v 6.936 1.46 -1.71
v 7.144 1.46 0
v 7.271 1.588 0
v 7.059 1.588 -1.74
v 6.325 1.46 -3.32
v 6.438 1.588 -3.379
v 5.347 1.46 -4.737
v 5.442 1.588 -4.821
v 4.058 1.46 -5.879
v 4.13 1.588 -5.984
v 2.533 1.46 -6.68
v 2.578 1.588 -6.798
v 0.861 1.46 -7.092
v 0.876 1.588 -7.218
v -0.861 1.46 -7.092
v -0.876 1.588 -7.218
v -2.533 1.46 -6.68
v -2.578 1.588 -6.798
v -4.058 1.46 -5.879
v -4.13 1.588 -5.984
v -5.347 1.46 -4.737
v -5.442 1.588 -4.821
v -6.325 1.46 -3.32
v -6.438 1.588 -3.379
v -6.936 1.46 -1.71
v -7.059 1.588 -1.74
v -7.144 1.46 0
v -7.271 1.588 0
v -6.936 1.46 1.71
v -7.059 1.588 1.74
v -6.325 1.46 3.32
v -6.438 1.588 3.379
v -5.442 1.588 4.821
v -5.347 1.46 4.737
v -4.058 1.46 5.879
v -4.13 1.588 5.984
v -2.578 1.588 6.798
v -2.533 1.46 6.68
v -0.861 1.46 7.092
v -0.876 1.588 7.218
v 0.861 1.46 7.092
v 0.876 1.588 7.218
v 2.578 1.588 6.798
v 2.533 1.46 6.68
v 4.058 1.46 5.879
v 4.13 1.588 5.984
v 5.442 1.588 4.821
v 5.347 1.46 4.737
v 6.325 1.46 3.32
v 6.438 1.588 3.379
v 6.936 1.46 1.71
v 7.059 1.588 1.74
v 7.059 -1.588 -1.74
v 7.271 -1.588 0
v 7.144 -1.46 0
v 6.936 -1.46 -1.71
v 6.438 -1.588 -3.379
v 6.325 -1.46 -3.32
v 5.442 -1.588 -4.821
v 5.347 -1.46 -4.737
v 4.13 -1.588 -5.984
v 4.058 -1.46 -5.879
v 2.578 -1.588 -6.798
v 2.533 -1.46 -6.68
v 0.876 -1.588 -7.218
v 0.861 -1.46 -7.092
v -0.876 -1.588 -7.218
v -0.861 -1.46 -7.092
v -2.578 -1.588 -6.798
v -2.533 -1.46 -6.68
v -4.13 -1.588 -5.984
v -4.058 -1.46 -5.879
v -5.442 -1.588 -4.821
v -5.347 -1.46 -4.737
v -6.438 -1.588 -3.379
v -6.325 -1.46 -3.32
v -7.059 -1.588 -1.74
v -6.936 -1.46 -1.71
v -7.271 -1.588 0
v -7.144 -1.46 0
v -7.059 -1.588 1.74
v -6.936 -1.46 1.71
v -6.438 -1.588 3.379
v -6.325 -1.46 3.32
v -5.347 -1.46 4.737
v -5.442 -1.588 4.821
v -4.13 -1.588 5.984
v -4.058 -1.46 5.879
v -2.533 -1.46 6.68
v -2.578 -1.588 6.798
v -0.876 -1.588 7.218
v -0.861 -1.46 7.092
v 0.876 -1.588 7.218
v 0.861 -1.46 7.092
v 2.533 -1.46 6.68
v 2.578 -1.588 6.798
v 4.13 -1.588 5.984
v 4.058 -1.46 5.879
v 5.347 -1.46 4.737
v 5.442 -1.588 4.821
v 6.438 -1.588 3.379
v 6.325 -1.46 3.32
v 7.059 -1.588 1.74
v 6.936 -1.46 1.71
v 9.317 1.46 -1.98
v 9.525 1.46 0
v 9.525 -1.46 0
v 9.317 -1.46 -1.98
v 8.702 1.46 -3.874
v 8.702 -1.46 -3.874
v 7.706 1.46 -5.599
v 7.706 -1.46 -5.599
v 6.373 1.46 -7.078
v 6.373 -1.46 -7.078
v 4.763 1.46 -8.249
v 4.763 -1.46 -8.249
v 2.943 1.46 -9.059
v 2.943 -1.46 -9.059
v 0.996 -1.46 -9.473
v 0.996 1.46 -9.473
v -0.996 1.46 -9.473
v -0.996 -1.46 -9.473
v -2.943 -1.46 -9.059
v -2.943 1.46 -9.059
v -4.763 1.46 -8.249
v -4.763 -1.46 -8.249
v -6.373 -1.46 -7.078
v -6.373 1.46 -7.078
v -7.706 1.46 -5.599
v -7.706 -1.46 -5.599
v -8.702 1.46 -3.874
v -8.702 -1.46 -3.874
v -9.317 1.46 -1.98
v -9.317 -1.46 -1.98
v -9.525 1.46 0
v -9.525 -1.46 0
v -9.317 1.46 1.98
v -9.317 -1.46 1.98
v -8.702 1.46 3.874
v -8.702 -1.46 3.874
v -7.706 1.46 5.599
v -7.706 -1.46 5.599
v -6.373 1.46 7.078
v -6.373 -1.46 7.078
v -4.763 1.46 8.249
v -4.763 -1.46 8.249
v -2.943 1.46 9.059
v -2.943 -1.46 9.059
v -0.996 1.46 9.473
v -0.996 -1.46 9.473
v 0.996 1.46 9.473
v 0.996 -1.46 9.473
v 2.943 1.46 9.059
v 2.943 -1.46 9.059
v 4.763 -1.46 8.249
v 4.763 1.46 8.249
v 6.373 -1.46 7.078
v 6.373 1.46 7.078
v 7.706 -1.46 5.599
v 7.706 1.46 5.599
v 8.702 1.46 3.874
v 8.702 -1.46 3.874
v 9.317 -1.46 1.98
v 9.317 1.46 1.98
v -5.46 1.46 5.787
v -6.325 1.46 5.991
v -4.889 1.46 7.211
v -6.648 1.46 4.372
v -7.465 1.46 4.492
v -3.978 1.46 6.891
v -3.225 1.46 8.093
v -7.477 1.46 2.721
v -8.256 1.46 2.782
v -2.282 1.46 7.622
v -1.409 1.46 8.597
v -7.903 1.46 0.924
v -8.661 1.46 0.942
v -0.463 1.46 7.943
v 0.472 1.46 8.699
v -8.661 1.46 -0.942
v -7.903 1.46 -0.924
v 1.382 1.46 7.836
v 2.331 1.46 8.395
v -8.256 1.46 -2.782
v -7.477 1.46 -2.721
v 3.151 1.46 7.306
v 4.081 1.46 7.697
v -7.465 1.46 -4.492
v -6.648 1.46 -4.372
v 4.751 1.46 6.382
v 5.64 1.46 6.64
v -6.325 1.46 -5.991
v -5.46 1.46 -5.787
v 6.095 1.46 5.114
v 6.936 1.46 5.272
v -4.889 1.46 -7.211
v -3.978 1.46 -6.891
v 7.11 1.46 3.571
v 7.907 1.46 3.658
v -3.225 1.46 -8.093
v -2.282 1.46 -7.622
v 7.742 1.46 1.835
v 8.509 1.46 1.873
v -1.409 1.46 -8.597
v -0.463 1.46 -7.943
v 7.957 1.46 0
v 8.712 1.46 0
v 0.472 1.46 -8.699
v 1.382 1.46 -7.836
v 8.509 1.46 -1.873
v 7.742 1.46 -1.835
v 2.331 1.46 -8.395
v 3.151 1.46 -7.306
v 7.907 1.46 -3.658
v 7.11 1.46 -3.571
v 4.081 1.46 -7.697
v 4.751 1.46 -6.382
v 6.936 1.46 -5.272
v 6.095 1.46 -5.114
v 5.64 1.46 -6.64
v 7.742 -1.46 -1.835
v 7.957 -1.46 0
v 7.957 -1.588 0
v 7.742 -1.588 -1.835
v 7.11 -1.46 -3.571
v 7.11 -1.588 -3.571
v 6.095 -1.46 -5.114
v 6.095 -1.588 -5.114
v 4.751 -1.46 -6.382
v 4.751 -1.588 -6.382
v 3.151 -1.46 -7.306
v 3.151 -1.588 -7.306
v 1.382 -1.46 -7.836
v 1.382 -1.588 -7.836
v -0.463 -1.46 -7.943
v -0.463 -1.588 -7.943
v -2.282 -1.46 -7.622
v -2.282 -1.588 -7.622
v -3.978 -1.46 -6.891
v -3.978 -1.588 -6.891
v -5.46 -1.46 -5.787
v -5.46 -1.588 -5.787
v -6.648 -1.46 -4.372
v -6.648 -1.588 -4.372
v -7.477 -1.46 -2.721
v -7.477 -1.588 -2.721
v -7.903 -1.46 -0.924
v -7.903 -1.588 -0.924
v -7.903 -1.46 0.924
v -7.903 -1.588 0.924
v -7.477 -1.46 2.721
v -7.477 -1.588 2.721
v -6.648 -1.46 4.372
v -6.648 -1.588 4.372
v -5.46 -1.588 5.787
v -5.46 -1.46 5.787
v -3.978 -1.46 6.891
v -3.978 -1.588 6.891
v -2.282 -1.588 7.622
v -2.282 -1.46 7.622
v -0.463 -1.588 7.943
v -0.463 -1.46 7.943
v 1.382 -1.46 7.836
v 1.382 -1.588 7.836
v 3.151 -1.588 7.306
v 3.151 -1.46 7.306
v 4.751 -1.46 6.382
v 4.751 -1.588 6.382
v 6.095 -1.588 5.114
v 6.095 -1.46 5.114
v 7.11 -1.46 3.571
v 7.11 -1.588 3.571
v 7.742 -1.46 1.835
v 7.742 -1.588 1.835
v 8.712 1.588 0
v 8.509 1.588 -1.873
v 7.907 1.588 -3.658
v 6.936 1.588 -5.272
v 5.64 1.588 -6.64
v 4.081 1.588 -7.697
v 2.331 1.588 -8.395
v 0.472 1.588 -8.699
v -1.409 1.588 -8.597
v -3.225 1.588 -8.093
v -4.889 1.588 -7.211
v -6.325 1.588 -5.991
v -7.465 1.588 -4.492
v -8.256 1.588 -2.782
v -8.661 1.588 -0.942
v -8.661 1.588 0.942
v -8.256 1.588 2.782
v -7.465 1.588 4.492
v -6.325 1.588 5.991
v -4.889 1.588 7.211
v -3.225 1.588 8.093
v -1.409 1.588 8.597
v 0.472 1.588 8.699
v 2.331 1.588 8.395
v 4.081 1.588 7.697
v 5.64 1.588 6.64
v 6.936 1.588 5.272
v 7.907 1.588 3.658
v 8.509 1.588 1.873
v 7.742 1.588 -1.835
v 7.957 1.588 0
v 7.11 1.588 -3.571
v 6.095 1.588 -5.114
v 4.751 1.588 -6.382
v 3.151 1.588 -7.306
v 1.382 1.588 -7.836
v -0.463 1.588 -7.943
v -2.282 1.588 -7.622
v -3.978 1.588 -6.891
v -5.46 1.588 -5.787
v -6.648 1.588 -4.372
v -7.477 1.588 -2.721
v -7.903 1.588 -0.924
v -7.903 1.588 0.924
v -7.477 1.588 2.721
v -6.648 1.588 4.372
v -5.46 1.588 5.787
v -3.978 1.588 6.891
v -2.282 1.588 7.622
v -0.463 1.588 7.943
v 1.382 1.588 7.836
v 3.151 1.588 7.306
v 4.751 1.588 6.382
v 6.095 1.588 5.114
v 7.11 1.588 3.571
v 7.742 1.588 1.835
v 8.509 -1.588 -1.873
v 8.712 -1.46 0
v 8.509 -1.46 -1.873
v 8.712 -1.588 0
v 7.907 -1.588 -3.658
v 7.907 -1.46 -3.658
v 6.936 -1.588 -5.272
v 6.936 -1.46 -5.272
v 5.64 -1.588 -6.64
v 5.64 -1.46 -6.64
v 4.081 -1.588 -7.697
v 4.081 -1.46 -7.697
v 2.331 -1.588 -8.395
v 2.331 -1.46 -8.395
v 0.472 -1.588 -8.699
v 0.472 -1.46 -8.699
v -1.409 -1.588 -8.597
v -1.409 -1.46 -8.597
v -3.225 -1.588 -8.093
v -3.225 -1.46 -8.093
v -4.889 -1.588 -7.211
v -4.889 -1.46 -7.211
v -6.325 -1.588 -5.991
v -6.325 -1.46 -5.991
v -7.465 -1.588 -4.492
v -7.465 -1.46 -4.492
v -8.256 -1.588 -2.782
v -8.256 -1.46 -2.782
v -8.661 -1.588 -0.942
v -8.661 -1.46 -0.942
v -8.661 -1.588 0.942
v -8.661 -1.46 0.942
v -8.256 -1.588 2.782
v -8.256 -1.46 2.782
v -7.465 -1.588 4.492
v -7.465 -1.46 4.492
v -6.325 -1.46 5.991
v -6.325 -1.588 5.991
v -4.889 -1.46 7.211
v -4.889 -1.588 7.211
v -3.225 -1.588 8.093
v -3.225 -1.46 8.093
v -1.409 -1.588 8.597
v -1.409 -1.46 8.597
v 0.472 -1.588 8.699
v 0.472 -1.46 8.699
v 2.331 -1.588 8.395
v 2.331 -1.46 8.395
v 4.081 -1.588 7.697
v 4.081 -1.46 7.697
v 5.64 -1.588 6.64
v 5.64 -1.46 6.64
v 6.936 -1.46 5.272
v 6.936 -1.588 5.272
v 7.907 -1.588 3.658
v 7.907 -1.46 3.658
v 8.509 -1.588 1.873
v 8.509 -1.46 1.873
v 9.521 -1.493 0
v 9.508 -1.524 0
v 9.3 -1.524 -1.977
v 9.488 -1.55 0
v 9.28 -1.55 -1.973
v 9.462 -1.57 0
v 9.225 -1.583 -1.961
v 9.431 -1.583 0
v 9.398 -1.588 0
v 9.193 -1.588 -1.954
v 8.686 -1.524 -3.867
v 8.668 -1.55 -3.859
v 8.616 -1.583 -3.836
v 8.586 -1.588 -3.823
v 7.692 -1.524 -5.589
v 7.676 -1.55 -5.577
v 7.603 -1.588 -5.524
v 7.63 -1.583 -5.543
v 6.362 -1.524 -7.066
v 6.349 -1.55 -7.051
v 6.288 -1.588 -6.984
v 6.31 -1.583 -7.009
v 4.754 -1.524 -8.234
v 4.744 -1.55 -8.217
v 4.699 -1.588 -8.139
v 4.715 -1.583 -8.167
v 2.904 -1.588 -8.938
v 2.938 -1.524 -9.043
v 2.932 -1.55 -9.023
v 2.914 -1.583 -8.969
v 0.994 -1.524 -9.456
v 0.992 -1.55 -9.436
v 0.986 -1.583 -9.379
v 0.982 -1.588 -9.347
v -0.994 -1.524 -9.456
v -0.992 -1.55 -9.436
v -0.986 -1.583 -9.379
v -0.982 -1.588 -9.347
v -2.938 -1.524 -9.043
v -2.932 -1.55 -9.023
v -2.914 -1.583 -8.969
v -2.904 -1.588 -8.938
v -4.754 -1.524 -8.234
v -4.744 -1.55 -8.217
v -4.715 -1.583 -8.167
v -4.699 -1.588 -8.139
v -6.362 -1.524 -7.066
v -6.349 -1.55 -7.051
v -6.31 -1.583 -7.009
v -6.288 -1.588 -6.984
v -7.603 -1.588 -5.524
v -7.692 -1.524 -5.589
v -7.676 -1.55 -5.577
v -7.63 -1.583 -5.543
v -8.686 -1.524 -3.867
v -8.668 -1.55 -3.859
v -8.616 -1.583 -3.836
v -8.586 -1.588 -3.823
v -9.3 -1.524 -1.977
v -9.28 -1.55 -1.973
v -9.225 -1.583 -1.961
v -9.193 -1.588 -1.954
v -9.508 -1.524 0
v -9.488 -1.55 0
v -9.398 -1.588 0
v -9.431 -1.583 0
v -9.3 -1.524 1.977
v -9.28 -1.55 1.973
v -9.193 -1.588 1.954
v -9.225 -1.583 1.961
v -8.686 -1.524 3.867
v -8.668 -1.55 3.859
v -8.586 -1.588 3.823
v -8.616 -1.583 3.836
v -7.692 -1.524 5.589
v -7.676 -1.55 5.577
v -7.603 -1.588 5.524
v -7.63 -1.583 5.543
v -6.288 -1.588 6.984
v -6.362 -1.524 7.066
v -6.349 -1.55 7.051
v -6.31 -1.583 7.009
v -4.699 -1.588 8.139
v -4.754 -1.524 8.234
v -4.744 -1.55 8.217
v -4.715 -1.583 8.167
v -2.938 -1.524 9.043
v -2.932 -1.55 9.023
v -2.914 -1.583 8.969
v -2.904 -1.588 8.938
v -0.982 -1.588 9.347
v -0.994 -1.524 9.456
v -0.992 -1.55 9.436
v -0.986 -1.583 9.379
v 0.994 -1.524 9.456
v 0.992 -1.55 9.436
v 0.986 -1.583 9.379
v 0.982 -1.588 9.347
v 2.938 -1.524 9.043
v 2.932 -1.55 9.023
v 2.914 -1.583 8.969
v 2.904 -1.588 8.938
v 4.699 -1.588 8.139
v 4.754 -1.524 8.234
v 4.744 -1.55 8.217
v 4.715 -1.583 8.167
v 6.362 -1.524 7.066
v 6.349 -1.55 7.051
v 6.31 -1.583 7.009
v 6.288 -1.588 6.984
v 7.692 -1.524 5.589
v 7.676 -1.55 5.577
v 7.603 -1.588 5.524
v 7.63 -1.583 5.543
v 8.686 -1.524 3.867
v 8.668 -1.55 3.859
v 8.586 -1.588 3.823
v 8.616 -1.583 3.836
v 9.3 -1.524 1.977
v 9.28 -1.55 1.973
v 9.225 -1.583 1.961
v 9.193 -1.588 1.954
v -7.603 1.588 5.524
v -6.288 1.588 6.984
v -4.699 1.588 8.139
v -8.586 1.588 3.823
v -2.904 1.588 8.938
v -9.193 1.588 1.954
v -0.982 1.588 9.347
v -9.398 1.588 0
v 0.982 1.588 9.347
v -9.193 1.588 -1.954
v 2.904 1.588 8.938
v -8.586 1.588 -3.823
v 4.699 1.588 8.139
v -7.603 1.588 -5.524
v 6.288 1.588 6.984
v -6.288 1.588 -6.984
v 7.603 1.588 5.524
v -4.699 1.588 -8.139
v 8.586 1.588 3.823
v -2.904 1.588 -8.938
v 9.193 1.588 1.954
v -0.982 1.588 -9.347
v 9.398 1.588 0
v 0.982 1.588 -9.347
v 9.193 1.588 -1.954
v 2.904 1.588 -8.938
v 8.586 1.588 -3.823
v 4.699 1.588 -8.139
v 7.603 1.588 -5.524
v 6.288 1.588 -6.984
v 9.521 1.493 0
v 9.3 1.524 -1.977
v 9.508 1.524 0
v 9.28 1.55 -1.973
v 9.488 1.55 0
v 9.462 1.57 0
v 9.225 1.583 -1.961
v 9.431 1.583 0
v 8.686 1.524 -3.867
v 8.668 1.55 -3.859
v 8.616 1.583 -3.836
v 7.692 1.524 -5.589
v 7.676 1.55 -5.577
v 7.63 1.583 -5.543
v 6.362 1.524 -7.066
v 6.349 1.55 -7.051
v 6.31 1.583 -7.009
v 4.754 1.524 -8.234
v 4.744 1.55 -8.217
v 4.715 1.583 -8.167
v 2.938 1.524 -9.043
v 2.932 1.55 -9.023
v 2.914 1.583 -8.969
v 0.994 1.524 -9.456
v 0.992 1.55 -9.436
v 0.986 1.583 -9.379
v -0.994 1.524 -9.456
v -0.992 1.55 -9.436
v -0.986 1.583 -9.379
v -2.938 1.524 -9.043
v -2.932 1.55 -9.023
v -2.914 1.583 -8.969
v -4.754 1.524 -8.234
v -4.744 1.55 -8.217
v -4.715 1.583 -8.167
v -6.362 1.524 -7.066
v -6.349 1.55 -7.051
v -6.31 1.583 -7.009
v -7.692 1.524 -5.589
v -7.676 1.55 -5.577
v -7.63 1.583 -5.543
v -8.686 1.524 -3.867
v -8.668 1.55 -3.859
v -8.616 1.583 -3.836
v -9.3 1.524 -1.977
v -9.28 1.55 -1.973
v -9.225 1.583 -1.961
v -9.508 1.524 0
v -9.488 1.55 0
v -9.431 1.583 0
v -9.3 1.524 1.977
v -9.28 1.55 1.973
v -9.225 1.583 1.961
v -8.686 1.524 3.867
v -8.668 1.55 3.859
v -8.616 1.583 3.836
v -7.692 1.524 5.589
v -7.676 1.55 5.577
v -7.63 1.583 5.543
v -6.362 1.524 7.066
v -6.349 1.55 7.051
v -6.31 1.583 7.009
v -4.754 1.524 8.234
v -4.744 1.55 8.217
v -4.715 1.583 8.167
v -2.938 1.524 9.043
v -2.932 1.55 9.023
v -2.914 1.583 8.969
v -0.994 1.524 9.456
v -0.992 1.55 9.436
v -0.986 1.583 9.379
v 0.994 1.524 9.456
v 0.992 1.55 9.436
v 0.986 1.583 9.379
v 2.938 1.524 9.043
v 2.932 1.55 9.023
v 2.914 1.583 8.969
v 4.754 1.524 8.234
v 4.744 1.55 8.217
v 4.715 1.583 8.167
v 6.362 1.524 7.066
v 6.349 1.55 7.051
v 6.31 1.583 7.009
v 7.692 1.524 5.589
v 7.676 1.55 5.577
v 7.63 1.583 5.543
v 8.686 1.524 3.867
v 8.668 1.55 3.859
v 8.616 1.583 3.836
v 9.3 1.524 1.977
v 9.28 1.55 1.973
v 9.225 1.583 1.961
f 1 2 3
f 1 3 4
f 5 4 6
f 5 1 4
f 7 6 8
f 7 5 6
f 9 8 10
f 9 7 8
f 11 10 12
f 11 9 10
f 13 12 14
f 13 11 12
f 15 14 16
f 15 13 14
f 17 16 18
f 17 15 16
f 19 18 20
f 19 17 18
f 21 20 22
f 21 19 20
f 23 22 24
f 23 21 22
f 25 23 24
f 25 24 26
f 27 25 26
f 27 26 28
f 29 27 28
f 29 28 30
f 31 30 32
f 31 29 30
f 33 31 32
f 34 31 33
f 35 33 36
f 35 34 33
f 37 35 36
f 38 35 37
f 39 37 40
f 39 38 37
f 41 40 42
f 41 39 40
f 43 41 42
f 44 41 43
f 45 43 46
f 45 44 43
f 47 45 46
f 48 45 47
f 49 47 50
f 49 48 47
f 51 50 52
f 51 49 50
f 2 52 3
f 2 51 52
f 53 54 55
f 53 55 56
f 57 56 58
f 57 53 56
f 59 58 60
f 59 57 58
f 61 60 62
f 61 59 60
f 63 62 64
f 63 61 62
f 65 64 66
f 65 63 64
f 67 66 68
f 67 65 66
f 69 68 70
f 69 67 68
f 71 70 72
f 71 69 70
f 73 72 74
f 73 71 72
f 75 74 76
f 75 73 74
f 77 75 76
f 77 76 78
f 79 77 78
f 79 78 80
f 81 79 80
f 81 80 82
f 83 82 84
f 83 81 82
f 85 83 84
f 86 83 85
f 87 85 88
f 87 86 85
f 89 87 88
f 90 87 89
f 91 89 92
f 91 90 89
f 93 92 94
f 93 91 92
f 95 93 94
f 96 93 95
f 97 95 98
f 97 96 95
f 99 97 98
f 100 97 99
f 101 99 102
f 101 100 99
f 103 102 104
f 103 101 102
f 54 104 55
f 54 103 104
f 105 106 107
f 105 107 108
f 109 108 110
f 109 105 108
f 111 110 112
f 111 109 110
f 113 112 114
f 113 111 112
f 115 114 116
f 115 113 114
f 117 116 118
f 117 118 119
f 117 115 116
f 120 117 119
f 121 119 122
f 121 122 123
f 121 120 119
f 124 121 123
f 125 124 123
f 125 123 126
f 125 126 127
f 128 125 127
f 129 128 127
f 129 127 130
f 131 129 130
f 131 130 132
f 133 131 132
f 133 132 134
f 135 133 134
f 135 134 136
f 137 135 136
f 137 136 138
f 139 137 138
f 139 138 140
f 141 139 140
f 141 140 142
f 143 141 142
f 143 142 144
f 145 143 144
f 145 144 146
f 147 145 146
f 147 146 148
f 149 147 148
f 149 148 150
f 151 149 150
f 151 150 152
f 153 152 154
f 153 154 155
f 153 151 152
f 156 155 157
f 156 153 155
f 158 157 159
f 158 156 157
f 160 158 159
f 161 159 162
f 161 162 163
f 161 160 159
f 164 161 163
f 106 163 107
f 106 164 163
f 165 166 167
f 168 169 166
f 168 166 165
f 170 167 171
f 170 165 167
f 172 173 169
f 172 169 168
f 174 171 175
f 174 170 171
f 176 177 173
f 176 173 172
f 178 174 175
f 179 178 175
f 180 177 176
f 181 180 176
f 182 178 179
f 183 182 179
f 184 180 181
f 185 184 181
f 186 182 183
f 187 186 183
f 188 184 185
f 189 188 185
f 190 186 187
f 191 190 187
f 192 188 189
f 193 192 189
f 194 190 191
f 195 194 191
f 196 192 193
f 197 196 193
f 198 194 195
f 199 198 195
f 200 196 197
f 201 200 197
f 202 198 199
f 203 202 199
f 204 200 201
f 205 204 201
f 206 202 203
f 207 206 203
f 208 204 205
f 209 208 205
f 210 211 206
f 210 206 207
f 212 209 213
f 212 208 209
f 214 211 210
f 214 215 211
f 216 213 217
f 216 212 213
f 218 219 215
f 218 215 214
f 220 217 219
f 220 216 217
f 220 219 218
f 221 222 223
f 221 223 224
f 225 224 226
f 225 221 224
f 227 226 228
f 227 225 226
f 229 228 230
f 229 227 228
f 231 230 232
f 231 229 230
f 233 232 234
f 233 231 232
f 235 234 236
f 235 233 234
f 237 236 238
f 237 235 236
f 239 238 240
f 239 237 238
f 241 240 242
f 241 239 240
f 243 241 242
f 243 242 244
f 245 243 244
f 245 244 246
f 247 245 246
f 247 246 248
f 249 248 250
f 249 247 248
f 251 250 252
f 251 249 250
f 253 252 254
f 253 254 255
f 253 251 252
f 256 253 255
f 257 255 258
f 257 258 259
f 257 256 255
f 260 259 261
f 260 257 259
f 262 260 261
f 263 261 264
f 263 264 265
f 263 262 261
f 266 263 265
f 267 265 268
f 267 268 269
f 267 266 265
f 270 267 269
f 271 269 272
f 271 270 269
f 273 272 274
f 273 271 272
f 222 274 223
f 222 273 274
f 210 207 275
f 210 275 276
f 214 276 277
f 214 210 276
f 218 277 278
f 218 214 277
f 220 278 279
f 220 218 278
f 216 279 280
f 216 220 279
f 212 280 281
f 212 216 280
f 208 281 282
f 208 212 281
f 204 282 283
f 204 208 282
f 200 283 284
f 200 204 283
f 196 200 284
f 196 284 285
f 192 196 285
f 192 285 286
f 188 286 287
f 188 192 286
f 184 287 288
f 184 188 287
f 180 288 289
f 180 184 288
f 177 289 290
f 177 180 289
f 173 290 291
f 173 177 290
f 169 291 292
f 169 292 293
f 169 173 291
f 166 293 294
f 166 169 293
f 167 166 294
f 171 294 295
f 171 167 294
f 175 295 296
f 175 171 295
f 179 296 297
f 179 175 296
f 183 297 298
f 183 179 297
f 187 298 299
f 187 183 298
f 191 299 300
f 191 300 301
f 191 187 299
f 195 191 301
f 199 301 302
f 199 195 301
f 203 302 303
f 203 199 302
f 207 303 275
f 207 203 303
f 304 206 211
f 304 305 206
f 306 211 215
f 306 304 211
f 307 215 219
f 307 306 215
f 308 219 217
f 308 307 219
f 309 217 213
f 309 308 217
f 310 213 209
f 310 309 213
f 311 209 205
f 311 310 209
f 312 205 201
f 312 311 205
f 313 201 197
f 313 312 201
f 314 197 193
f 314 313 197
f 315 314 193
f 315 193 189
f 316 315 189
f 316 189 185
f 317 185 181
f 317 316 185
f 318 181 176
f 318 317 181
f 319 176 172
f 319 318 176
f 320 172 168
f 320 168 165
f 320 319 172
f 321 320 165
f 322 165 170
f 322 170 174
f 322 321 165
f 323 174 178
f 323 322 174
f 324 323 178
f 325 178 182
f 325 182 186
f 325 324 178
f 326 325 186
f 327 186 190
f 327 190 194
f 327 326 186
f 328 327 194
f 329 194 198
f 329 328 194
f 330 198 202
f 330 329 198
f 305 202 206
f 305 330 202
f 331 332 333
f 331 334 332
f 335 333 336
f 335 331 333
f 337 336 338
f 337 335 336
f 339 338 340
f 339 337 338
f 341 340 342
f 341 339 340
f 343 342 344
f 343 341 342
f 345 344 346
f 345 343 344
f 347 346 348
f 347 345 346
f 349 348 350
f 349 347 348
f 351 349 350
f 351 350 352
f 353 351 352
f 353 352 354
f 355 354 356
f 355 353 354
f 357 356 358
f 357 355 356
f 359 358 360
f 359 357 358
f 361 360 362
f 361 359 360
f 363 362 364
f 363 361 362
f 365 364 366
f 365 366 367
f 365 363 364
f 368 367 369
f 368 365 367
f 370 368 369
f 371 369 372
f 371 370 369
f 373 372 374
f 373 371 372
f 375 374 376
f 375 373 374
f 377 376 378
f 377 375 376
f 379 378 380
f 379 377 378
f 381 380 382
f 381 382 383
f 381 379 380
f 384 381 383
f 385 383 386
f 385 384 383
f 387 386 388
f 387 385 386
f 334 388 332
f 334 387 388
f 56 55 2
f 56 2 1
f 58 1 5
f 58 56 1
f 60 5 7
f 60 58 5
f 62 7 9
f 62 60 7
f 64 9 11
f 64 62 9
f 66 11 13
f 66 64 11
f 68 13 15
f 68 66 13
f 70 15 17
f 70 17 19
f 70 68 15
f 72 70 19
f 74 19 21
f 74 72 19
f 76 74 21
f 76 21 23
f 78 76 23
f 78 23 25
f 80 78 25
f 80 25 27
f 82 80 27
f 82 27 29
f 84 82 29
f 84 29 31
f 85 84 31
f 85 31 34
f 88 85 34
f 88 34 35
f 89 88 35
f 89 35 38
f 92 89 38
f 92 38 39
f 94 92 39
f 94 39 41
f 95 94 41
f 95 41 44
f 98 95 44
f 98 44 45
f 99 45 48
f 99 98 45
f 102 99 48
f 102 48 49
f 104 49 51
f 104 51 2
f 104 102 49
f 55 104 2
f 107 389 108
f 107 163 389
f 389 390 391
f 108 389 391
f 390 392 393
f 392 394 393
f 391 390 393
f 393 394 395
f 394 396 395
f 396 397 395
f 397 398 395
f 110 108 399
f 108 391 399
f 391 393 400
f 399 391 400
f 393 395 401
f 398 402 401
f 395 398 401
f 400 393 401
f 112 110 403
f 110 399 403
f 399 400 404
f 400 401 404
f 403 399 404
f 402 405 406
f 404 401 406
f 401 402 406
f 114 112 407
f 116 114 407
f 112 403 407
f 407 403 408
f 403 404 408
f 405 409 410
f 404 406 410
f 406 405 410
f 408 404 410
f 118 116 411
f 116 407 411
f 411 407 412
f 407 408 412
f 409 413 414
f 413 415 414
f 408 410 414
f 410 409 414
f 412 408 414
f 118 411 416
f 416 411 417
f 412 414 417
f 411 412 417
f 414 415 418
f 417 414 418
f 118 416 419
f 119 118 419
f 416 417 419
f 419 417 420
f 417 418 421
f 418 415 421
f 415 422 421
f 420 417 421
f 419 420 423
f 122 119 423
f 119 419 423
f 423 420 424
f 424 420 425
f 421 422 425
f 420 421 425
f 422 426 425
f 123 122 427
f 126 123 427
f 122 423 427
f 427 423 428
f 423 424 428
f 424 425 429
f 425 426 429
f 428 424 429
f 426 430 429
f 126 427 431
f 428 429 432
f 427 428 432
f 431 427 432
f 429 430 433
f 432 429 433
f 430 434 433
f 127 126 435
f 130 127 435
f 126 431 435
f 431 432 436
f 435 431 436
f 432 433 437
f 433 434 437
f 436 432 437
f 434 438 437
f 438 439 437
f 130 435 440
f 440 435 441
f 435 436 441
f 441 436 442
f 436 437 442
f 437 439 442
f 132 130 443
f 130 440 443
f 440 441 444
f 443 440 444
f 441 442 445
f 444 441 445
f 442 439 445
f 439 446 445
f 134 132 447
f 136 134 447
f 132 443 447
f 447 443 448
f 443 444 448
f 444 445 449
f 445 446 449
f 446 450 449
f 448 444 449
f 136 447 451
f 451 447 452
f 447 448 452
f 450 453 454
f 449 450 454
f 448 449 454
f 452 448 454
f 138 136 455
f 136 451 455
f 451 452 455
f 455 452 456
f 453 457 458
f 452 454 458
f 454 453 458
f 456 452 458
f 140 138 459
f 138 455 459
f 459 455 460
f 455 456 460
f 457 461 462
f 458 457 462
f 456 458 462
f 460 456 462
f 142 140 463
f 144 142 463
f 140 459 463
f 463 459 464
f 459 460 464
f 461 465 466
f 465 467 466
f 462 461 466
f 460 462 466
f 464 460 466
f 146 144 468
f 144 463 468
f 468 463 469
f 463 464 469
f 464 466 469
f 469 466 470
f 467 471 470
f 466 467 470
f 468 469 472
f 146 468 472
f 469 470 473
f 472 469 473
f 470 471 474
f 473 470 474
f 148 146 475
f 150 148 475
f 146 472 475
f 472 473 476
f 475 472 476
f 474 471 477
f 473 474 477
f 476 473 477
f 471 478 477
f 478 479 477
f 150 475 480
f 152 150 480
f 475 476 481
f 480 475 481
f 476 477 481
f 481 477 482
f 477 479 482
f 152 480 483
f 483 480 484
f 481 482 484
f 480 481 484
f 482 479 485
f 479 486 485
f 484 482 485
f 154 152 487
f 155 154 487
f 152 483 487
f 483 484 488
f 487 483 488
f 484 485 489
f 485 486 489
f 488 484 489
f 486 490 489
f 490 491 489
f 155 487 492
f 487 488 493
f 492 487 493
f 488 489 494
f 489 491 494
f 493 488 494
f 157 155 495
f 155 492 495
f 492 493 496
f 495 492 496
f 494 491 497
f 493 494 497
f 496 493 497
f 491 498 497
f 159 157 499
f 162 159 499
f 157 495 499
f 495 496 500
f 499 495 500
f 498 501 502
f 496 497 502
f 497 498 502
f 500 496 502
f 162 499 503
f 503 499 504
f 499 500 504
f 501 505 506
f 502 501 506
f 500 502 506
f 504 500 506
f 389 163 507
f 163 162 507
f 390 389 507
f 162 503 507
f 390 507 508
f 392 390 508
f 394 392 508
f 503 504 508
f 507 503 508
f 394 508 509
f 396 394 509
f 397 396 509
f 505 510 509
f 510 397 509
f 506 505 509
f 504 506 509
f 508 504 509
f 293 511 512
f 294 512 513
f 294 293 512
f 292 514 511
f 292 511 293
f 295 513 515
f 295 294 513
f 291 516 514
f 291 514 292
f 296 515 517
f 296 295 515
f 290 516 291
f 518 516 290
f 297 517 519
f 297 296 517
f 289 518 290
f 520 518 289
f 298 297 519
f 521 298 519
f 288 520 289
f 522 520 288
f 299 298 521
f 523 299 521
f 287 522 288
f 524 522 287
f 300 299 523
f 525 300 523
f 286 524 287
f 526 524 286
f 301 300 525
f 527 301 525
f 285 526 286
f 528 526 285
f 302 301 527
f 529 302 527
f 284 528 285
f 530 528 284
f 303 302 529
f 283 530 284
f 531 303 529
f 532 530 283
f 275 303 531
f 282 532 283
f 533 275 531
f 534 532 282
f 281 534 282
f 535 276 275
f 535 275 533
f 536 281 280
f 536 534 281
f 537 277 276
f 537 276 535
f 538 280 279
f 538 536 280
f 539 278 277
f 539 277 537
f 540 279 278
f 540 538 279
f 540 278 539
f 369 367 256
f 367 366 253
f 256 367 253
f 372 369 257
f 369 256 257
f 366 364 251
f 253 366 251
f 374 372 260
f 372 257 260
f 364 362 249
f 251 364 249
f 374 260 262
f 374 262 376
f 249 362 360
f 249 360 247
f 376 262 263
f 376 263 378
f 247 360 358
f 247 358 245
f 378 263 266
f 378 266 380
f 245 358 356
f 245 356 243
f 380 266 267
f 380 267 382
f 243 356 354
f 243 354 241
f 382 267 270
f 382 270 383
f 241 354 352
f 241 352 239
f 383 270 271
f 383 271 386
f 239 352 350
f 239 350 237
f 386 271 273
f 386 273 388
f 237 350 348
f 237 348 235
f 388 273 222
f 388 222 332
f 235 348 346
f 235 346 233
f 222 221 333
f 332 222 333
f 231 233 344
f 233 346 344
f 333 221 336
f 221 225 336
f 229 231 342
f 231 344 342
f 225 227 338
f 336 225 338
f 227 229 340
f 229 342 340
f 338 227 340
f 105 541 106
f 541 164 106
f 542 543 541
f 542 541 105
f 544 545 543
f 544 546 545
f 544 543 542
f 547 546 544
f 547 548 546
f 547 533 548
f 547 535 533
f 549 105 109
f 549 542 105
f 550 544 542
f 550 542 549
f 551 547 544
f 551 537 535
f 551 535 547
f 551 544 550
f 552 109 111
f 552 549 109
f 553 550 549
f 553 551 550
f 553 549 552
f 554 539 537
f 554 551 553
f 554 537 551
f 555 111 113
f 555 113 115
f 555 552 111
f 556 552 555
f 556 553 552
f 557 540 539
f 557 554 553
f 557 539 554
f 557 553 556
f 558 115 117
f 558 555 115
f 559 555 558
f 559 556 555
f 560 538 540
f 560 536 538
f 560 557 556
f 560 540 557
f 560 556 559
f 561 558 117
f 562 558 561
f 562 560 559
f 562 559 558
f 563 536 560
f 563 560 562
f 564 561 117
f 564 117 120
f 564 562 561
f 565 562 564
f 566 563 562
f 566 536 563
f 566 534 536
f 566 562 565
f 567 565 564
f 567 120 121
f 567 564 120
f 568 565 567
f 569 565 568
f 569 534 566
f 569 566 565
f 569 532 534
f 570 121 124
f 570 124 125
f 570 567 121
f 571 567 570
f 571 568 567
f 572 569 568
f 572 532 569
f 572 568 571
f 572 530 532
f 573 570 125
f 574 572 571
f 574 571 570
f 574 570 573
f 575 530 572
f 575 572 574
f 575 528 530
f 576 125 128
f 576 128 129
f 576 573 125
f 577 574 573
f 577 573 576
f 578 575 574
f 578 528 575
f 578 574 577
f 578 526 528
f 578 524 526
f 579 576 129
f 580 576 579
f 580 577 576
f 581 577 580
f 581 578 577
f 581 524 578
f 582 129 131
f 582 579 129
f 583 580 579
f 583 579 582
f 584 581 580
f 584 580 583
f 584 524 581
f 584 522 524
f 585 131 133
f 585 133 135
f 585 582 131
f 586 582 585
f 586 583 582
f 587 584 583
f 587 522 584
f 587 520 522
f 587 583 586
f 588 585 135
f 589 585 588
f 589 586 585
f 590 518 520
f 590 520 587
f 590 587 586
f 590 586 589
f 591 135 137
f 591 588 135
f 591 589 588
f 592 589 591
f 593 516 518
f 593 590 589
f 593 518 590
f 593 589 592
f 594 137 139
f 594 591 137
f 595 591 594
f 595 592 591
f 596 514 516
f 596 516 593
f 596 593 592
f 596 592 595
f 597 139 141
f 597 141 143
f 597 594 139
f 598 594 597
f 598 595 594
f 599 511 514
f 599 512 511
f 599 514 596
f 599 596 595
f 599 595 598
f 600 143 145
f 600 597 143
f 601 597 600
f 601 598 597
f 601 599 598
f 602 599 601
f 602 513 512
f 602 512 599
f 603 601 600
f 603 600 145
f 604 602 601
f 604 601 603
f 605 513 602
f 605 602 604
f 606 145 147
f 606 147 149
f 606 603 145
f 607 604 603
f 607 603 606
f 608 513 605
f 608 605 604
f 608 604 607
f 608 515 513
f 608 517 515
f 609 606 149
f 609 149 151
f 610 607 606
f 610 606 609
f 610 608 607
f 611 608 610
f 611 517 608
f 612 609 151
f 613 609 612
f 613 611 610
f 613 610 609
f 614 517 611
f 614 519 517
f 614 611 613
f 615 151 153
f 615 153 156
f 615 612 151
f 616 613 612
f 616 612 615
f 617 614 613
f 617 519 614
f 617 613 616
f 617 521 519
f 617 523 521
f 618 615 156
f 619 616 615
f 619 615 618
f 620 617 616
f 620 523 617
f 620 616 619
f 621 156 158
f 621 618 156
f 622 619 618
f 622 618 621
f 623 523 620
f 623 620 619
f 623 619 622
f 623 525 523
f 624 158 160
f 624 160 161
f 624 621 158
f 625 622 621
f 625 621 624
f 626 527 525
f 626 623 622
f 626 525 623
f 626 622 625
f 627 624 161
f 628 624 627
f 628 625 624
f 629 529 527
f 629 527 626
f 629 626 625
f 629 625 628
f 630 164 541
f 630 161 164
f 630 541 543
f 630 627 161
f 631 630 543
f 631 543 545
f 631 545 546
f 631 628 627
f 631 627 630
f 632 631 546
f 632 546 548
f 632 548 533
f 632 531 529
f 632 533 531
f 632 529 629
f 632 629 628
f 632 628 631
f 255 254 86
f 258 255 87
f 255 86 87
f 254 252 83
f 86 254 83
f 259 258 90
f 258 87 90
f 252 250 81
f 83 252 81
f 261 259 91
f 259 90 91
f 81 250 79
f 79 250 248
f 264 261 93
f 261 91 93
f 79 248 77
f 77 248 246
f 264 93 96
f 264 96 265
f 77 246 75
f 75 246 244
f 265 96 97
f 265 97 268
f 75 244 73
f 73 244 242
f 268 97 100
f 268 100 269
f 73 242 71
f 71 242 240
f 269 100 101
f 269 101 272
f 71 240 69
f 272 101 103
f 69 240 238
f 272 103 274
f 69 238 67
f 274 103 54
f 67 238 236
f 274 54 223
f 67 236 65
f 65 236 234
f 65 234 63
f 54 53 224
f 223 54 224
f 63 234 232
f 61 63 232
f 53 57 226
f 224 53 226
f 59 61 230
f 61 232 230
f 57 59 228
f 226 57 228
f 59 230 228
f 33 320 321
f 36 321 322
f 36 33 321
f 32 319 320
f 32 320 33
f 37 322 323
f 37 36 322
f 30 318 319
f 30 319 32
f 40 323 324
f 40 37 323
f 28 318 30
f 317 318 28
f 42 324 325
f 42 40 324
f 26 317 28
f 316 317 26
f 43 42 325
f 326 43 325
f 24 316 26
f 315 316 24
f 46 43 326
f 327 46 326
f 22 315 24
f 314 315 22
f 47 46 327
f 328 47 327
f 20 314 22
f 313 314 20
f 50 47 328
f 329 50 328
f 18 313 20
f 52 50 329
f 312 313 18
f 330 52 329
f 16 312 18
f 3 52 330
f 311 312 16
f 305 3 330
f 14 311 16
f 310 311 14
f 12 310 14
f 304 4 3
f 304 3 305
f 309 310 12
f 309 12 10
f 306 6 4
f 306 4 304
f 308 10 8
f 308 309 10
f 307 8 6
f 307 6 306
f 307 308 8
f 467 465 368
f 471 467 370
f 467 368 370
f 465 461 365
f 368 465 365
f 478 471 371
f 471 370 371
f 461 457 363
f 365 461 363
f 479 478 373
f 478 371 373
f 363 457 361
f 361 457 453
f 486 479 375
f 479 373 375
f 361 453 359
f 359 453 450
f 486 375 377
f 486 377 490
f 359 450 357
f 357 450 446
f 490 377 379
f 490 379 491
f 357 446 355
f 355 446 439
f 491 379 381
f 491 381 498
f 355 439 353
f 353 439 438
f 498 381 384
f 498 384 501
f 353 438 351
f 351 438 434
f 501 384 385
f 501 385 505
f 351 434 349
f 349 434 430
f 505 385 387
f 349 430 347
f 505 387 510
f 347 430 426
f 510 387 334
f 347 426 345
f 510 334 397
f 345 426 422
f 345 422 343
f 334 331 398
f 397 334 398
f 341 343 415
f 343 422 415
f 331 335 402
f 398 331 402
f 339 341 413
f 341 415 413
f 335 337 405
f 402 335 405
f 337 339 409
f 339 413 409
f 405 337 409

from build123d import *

# Parameters (mm, degrees)
SKETCH1_R             = 9.525
SKETCH1_R_2           = 8.7122
BOSS_EXTRUDE1_DEPTH   = 1.5875
SKETCH1_R_3           = 7.95655
SKETCH1_R_4           = 7.14375
BOSS_EXTRUDE1_2_DEPTH = 1.5875
FILLET1_R             = 0.127
CHAMFER1_SIZE         = 0.127
SKETCH2_R             = 8.7122
SKETCH2_R_2           = 7.95655
BOSS_EXTRUDE2_DEPTH   = 1.4605


with BuildPart() as part:
    # Sketch1 → Boss-Extrude1 (new body, symmetric)
    with BuildSketch(Plane(origin=(0, 0, 0), x_dir=(1, 0, 0), z_dir=(0, 1, 0))):
        Circle(SKETCH1_R)
        Circle(SKETCH1_R_2, mode=Mode.SUBTRACT)
    extrude(amount=BOSS_EXTRUDE1_DEPTH, both=True)

    # Fillet1
    fillet1_edges = [part.edges().sort_by_distance(p)[0] for p in [
        (-9.525, -1.5875, 0),
        (-9.525, 1.5875, 0),
    ]]
    fillet(fillet1_edges, radius=FILLET1_R)



with BuildPart() as body_2:
    # Sketch1 → Boss-Extrude1 2 (new body, symmetric)
    with BuildSketch(Plane(origin=(0, 0, 0), x_dir=(1, 0, 0), z_dir=(0, 1, 0))):
        Circle(SKETCH1_R_3)
        Circle(SKETCH1_R_4, mode=Mode.SUBTRACT)
    extrude(amount=BOSS_EXTRUDE1_2_DEPTH, both=True)

    # Chamfer1
    chamfer1_edges = [body_2.edges().sort_by_distance(p)[0] for p in [
        (-7.14375, -1.5875, 0),
        (-7.14375, 1.5875, 0),
    ]]
    chamfer(chamfer1_edges, length=CHAMFER1_SIZE)


with BuildPart() as part_1:
    add(part.part)

    add(body_2.part)  # Boss-Extrude2 merges body 2
    # Sketch2 → Boss-Extrude2 (add, symmetric)
    with BuildSketch(Plane(origin=(0, 0, 0), x_dir=(1, 0, 0), z_dir=(0, 1, 0))):
        Circle(SKETCH2_R)
        Circle(SKETCH2_R_2, mode=Mode.SUBTRACT)
    extrude(amount=BOSS_EXTRUDE2_DEPTH, both=True)


solid = part_1.part
